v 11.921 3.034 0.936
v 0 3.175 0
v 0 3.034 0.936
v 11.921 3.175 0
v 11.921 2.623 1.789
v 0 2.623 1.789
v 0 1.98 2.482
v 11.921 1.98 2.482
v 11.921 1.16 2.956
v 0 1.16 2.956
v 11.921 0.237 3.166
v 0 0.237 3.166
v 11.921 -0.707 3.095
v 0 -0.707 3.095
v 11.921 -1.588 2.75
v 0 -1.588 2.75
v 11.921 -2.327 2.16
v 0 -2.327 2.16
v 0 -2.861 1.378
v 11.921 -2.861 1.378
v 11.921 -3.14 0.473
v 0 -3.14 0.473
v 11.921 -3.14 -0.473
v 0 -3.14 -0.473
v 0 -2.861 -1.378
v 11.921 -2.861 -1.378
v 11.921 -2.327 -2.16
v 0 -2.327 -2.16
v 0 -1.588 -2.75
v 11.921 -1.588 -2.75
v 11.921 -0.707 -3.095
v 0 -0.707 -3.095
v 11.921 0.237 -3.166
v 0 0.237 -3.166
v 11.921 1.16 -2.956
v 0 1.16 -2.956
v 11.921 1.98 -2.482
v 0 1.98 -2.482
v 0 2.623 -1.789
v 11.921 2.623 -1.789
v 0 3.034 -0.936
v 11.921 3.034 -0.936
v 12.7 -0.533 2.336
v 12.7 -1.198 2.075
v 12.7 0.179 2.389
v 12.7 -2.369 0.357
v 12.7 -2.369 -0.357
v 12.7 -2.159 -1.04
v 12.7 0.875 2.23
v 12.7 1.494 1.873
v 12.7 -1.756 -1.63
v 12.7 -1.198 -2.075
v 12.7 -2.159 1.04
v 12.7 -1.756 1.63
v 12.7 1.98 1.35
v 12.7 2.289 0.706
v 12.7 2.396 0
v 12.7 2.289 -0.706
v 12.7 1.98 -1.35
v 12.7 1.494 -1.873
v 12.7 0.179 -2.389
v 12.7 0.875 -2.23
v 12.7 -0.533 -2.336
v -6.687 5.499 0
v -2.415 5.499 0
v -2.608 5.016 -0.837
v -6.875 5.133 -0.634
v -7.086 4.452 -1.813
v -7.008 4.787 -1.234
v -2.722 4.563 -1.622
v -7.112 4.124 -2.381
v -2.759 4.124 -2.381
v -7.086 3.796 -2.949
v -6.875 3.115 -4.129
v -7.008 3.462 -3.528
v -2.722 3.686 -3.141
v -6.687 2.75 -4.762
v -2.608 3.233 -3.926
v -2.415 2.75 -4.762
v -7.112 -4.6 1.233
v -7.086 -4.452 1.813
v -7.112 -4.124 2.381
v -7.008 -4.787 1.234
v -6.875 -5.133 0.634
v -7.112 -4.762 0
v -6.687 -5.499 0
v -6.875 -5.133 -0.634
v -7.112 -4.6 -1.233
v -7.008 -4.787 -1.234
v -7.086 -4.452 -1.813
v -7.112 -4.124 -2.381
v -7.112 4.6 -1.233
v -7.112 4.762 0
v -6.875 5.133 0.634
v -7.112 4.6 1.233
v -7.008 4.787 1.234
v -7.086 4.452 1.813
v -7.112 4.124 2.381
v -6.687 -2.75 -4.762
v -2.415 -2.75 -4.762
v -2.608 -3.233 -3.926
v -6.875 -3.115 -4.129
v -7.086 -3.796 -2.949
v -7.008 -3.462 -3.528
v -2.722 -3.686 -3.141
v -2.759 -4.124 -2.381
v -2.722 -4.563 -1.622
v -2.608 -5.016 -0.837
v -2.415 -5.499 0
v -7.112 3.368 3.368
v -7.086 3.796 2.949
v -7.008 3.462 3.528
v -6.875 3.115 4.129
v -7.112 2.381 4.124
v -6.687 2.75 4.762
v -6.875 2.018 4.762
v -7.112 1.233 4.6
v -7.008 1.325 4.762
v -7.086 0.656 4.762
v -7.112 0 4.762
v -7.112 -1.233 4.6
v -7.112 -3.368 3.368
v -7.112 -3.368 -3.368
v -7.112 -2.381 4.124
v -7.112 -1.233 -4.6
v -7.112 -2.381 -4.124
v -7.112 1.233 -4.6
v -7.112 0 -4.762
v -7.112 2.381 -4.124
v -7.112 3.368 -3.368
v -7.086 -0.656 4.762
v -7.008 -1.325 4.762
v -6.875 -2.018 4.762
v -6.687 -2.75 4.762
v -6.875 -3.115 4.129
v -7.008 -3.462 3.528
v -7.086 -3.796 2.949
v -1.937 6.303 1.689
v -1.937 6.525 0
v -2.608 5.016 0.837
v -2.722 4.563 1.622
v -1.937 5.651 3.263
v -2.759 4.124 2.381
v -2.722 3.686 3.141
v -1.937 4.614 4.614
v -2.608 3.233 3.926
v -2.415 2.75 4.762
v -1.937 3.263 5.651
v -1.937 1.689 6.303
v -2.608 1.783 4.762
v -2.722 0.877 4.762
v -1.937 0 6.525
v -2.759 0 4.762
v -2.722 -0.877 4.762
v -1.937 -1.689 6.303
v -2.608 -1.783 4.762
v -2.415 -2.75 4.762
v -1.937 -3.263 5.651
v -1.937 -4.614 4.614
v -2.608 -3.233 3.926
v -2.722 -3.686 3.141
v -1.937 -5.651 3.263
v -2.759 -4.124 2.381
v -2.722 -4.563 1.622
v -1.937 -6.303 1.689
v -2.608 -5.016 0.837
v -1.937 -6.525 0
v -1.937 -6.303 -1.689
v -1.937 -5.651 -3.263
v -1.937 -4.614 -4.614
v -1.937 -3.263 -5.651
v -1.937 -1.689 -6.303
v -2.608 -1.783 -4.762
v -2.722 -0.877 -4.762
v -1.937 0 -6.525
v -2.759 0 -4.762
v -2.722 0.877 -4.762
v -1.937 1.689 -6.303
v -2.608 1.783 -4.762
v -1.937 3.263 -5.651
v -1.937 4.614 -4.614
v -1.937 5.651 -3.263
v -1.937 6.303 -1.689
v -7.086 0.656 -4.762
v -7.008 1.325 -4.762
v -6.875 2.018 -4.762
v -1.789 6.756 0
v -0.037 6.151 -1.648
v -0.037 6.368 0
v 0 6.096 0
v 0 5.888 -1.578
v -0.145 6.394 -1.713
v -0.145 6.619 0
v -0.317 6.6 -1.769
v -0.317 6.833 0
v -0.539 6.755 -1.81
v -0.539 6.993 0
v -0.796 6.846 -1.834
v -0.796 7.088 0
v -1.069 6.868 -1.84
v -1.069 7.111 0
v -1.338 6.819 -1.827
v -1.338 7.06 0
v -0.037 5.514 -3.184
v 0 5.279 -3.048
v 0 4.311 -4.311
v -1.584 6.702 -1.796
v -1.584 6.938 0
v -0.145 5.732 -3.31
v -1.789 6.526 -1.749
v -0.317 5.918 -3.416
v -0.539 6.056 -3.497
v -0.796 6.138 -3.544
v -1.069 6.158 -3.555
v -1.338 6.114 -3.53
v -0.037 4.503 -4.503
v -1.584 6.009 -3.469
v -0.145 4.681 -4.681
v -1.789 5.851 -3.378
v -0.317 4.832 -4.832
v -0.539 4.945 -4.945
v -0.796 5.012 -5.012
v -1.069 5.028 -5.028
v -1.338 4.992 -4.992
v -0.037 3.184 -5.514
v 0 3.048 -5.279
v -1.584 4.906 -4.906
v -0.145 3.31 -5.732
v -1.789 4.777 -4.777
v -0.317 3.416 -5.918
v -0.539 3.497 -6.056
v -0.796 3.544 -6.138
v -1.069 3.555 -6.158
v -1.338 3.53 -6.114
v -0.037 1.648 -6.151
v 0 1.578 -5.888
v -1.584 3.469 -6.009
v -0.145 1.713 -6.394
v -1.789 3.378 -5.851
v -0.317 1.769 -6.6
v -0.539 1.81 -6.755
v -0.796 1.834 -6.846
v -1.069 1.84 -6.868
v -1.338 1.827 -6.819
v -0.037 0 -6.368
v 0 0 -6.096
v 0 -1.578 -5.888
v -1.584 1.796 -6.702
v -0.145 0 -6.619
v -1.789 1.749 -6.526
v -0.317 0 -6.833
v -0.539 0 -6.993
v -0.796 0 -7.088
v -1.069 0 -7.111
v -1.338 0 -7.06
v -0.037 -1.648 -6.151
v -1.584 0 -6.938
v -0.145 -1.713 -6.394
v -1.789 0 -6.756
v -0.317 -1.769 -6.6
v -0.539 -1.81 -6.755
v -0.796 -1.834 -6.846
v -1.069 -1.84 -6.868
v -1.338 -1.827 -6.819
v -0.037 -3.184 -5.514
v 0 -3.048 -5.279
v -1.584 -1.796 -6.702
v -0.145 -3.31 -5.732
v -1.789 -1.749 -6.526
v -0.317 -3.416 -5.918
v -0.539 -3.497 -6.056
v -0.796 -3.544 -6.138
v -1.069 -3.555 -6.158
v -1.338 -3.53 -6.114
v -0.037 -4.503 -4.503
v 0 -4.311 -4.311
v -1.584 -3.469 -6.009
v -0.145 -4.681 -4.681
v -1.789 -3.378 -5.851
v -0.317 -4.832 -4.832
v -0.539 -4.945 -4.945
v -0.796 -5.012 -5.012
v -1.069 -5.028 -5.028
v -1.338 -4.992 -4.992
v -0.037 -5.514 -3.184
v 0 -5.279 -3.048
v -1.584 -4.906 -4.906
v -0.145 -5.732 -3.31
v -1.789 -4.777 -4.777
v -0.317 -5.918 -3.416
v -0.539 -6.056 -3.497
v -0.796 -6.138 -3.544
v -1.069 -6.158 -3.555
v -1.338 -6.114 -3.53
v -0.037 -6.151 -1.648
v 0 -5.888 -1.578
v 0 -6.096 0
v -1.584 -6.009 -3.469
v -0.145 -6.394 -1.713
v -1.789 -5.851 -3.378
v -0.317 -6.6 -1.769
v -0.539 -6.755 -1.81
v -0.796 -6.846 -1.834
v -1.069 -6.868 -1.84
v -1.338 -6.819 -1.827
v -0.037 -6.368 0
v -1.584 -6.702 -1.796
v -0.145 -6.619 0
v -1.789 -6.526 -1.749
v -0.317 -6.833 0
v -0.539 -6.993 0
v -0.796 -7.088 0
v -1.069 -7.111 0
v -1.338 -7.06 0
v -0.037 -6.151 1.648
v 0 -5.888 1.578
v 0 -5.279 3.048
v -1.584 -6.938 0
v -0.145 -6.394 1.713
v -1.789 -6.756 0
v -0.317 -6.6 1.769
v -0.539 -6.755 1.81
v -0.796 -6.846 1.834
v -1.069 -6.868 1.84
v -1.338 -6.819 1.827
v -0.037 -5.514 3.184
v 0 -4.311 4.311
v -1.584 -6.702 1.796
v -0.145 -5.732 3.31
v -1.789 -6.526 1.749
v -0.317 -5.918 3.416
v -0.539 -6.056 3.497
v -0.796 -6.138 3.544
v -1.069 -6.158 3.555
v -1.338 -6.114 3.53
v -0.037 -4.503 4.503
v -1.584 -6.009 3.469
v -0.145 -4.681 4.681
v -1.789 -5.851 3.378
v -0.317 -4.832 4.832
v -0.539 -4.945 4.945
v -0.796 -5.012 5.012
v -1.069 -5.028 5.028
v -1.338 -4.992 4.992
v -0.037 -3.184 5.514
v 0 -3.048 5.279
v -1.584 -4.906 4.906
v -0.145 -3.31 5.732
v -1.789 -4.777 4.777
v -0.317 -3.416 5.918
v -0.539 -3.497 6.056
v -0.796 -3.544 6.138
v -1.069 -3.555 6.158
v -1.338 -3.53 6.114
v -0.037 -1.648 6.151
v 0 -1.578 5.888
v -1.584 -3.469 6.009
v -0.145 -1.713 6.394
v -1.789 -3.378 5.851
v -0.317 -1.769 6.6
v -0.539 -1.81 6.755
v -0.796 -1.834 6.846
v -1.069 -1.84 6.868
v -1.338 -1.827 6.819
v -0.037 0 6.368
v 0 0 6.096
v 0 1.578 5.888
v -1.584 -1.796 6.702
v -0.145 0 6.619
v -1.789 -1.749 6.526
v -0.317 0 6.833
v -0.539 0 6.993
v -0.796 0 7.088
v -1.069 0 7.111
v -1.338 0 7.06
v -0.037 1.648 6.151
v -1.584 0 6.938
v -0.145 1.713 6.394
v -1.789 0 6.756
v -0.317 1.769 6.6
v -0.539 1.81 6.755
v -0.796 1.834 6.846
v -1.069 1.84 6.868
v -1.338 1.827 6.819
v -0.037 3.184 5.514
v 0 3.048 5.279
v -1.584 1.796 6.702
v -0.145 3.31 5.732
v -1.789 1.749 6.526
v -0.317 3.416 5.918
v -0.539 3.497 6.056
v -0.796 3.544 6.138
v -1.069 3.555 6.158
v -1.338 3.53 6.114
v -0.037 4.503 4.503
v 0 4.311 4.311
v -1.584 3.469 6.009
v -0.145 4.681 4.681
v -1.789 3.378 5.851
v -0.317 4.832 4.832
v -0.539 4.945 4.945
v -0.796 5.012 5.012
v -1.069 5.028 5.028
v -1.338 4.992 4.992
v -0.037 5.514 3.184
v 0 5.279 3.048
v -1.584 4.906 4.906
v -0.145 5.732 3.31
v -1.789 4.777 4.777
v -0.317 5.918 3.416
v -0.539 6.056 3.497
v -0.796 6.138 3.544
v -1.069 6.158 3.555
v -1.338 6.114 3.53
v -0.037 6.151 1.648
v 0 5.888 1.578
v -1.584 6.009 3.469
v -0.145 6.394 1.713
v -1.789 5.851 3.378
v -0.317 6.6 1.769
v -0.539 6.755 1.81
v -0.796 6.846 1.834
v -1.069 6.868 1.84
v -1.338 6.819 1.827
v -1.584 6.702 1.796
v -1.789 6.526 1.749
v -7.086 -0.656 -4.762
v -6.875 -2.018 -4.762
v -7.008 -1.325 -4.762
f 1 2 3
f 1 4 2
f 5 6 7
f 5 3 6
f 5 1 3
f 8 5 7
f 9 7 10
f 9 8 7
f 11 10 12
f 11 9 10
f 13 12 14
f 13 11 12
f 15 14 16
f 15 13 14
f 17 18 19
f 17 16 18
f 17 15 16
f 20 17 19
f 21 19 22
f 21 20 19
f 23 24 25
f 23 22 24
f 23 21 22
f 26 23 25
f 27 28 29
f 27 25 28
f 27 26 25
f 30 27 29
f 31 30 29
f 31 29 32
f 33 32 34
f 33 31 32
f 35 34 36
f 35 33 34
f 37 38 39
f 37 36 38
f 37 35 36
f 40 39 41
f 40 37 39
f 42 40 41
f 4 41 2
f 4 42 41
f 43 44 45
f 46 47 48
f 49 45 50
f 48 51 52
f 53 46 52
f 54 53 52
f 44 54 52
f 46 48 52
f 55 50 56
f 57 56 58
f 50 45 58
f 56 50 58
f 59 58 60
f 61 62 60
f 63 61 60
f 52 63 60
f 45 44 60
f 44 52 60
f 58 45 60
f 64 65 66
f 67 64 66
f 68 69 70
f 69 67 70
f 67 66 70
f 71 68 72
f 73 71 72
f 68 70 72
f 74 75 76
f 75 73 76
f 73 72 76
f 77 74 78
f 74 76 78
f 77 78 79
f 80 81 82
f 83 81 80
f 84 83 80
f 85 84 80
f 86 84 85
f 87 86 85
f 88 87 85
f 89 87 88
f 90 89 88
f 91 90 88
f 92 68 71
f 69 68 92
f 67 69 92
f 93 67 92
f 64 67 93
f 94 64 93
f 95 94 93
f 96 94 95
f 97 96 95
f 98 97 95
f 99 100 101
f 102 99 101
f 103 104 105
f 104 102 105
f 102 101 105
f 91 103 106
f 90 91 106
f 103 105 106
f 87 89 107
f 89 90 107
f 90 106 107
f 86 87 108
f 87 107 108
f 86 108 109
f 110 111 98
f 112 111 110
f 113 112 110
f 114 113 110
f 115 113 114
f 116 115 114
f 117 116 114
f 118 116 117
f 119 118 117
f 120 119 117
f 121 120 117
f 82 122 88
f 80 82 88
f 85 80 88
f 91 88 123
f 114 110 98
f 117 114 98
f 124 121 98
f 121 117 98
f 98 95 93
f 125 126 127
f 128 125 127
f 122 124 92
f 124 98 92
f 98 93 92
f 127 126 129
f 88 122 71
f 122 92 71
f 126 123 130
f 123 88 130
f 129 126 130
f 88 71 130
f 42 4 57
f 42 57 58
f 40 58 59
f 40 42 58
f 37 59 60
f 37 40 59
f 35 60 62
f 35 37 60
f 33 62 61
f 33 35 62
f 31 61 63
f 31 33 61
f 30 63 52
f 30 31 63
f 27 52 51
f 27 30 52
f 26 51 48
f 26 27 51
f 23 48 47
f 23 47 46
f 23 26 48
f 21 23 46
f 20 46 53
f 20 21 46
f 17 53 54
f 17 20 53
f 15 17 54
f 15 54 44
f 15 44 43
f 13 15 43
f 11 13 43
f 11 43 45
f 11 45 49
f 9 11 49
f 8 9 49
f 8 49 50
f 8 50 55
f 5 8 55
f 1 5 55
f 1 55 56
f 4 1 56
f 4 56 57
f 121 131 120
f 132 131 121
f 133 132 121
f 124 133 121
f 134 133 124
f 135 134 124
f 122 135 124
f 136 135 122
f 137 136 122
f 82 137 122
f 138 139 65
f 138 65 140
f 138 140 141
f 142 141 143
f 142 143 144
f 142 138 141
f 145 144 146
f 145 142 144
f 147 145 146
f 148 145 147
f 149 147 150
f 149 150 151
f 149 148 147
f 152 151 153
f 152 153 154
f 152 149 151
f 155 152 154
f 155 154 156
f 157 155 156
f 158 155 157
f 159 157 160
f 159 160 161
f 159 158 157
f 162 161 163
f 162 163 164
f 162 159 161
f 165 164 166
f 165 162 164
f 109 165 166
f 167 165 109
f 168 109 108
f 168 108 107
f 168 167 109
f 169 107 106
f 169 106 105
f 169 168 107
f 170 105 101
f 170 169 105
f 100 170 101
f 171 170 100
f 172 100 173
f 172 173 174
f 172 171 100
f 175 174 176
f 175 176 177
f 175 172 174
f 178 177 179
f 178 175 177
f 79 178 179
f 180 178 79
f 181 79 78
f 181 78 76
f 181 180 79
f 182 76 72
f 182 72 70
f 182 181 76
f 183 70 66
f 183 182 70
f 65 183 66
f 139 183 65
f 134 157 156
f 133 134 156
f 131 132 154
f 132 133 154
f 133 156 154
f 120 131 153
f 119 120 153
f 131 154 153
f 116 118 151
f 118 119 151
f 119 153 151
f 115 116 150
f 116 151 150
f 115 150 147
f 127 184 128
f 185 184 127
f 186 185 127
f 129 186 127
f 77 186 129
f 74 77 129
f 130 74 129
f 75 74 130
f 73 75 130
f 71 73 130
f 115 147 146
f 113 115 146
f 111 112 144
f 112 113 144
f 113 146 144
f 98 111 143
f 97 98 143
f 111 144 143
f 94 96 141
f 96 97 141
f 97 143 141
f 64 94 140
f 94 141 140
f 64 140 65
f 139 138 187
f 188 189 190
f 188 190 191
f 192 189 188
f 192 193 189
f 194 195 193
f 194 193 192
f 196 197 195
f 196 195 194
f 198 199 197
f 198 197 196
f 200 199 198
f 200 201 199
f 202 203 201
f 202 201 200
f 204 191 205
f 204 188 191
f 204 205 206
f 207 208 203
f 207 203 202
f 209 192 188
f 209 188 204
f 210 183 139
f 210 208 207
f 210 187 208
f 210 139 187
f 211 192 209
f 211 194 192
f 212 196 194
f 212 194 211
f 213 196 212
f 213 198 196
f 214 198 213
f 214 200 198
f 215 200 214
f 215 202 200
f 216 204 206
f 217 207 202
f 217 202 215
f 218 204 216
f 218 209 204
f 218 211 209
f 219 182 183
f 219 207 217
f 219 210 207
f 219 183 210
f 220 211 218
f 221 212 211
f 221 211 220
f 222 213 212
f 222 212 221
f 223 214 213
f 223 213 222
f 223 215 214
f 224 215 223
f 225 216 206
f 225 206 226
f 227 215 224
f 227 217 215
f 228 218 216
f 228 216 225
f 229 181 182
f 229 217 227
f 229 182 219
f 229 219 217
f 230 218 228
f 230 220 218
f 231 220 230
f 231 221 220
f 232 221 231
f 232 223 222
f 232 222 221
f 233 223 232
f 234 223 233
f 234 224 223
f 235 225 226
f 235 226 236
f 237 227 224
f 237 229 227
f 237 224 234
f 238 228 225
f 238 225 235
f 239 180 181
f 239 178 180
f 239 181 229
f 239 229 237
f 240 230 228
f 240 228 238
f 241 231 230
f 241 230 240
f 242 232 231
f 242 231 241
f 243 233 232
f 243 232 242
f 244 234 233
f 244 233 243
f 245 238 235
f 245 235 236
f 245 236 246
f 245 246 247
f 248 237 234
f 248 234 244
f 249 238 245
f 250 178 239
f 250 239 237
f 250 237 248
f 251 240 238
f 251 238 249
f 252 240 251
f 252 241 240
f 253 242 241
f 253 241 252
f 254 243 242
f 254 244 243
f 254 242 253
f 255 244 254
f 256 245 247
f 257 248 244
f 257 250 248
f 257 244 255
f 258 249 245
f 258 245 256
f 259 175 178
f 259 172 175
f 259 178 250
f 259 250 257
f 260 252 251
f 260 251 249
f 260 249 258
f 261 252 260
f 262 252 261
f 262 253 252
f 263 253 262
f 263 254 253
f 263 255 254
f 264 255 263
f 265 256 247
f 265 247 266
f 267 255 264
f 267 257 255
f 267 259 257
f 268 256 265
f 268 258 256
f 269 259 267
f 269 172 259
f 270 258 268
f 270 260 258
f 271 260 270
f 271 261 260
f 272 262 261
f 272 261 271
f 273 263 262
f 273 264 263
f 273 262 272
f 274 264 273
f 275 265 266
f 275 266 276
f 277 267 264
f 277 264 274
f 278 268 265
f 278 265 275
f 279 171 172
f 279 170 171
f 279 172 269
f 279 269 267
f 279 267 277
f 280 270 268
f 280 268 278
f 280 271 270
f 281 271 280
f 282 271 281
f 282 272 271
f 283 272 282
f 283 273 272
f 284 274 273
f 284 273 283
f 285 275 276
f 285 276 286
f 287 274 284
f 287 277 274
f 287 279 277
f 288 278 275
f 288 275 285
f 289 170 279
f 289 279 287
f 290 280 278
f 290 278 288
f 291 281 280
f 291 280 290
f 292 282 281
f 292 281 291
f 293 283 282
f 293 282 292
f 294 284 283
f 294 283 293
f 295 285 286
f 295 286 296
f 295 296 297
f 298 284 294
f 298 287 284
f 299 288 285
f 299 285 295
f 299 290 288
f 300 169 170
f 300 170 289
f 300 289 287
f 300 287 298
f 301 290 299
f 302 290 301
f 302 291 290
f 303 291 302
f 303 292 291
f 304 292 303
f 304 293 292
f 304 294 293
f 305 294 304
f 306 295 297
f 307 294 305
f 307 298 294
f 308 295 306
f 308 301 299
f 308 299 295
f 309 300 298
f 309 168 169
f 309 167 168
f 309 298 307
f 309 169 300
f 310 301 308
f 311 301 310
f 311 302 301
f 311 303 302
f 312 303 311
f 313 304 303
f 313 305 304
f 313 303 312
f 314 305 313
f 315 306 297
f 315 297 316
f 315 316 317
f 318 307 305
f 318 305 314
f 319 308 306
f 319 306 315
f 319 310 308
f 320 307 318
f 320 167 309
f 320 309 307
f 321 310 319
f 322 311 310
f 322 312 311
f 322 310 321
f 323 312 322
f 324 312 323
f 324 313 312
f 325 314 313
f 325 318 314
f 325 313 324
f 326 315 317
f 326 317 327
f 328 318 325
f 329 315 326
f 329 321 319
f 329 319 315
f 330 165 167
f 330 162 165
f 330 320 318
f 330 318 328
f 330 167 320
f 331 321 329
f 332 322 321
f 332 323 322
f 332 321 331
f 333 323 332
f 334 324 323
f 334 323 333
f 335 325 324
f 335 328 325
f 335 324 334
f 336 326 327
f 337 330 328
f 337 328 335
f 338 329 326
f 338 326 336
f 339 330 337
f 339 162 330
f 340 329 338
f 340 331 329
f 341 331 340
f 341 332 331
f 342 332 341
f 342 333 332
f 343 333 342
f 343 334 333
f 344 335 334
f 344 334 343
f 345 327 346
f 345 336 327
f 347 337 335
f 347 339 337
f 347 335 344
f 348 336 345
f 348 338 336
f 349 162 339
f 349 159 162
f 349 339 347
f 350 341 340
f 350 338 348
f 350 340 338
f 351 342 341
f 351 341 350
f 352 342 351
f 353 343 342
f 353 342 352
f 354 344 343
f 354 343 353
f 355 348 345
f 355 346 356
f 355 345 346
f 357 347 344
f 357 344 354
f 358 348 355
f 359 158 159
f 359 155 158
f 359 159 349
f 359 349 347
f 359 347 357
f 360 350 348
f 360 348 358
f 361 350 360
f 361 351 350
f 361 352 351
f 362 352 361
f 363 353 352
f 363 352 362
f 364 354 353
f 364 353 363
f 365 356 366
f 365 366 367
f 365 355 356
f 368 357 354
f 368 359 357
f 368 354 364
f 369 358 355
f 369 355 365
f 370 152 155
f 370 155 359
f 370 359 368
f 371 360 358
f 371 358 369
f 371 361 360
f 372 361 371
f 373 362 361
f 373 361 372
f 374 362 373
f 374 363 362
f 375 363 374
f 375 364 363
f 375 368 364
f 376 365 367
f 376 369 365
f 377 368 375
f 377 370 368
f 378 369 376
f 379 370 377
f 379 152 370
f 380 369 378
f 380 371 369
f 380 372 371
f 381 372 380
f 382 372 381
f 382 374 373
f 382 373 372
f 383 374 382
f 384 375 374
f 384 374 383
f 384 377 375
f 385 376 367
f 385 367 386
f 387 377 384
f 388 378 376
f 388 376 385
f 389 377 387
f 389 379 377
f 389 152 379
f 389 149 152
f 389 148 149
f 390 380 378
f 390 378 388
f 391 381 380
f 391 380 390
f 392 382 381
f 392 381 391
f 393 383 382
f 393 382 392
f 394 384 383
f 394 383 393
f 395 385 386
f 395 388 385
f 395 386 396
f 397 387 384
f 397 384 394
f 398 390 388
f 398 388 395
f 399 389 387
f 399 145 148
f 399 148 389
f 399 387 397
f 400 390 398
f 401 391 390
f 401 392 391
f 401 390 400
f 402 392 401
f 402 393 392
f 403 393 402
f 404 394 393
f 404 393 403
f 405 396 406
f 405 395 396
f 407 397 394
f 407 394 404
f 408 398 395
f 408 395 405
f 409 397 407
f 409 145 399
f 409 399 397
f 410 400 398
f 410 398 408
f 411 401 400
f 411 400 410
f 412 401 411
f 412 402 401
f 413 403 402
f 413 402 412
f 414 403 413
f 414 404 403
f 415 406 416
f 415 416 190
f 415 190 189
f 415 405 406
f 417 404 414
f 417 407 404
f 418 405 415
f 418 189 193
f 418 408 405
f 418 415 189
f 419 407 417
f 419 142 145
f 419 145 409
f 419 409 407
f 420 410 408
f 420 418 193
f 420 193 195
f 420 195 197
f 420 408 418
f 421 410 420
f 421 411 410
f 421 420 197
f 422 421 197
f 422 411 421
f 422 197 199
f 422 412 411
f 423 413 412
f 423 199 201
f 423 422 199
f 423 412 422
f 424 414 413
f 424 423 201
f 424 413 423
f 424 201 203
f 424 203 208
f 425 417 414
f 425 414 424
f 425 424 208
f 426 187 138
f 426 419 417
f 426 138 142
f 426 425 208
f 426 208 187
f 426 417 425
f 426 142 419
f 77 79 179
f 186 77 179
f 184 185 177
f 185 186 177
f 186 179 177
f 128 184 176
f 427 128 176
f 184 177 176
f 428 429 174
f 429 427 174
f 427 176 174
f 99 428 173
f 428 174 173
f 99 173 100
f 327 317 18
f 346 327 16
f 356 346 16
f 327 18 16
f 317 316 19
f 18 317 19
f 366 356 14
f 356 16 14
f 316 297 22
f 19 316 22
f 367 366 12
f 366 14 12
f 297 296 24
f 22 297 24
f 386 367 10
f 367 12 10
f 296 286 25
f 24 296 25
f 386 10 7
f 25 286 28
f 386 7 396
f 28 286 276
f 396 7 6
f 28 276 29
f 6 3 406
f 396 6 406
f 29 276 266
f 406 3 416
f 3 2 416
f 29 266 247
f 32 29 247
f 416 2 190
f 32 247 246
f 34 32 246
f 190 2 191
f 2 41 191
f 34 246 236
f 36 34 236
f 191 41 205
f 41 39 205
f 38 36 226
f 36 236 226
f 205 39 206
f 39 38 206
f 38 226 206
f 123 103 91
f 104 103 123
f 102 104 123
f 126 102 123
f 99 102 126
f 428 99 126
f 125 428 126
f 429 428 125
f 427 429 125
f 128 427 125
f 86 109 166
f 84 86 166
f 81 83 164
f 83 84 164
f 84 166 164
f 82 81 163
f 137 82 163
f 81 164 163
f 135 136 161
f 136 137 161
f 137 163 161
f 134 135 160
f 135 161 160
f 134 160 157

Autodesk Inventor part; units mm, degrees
ref_plane "YZ Plane" through (0, 0, 0) normal (1, 0, 0) x (0, 1, 0)
ref_plane "XZ Plane" through (0, 0, 0) normal (0, 1, 0) x (-1, 0, 0)
sketch "Sketch1" plane through (0, 0, 0) normal (0, 0, 1) x (1, 0, 0)
  line L0 (-3.2004, 0) -> (-3.2004, 3.8156)
  line L1 (0, 6.096) -> (0, 3.175)
  line L2 (1.905, 3.175) -> (12.7, 3.175)
  line L3 (12.7, 3.175) -> (12.7, 0)
  line L4 (12.7, 0) -> (-3.2004, 0)
  arc A0 (0, 6.096) -> (-1.9368, 6.5254) centre (-1.016, 6.096) ccw
  line L5 (0, -1.4605) -> (0, 8.7631) projected
  line L6 (-6.3805, 0) -> (15.8801, 0) projected
  line L7 (0, 3.175) -> (0.0001, 3.175)
  line L8 (0.0001, 3.175) -> (0.0001, 3.175)
  line L9 (0.0001, 3.175) -> (0.635, 3.175)
  line L10 (0.635, 3.175) -> (1.905, 3.175)
  line L11 (-3.2004, 3.8156) -> (-1.9368, 6.5254)
  line L12 (0.0001, 3.175) -> (1.905, 3.175) construction
  line L13 (1.905, 3.175) -> (1.905, 0) construction
  dimension "d0" = 1.016
  dimension "d1" = 12.7
  dimension "d2" = 10.795
  dimension "d3" = 14.224
  dimension "d4" = 6.35
  dimension "d5" = 3.2004
  dimension "d15" = 6.35
  dimension "d16" = 6.35
  dimension "d17" = 0.0001
  dimension "d18" = 1.27
  dimension "d19" = 25
revolve "Body" add sketch "Sketch1" angle 360 about axis through (12.7, 0, 0) along (-1, 0, 0)
sketch "Sketch2" plane through (0, 0, 0) normal (1, 0, 0) x (0, 0, -1)
  line L0 (4.7625, 2.7496) -> (4.7625, -2.7496)
  line L1 (4.7625, -2.7496) -> (0, -5.4993)
  line L2 (0, -5.4993) -> (-4.7625, -2.7496)
  line L3 (-4.7625, -2.7496) -> (-4.7625, 2.7496)
  line L4 (-4.7625, 2.7496) -> (0, 5.4993)
  line L5 (0, 5.4993) -> (4.7625, 2.7496)
  point P0 (0, 0)
  point P1 (0, 0)
  dimension "d23" = 9.525
extrude "Head" add sketch "Sketch2" against normal blind 7.112
sketch "Sketch3" plane through (0, 0, 0) normal (0, 0, 1) x (1, 0, 0)
  line L0 (-7.112, 4.7625) -> (-7.112, 5.4993)
  line L1 (-7.112, 5.4993) -> (-6.6866, 5.4993)
  line L2 (-6.6866, 5.4993) -> (-7.112, 4.7625)
  line L3 (-8.0513, 0) -> (-1.476, 0) projected
  line L4 (-7.112, 5.4993) -> (-7.112, 2.7496) projected
  line L5 (-2.4153, 5.4993) -> (-7.112, 5.4993) projected
  point P0 (-7.112, 2.7496)
  dimension "d8" = 30
  dimension "d22" = 9.525
revolve "Chamfer1" cut sketch "Sketch3" angle 360 about axis through (-10, 0, 0) along (1, 0, 0)
thread "Thread" size "1/4-20 UNC" class "2A" standard "ANSI Unified Screw Threads" length 10.795
chamfer "Chamfer2" distance 0.7791 distance2 0.7791 1 edges at (12.7, -3.175, 0) measured on face at (12.7, 1.0583, 0)
ref_plane "Work Plane1" through (10.95, 0, 0) normal (0, 0, -1) x (1, 0, 0)
equation "\"d0\" = PHH"
equation "\"d1\" = NLG"
equation "\"d2\" = GEL"
equation "\"d3\" = LADI"
equation "\"d4\" = GD"
equation "\"d5\" = 0.45 * KOH"
equation "\"d15\" = SD2"
equation "\"d16\" = BDM"
equation "\"d18\" = GAL"
equation "\"d19\" = KEWI"
equation "\"d23\" = SW"
equation "\"d6\" = KOH"
equation "\"d8\" = ANG1"
equation "\"d22\" = SW0"
equation "\"d10\" = GEL"
equation "\"d13\" = -0.5 * SPD + 0.5 * GD"
equation "\"d14\" = GUL"
equation "\"NLG\" = 12.7"
equation "\"GD\" = NND"
equation "\"BDM\" = NND"
equation "\"KOH\" = 7.112"
equation "\"GEL\" = 10.795"
equation "\"LADI\" = 14.224"
equation "\"SW\" = 9.525"
equation "\"PHH\" = 1.016"
equation "\"SW0\" = SW"
equation "\"SPD\" = 4.79184"
equation "\"SD2\" = NND"
equation "\"SD\" = 0"
equation "\"ANG1\" = 30deg"
equation "\"KEWI\" = 25deg"
equation "\"GAL\" = 1.27"
equation "\"GUL\" = 0.77908"
equation "\"THREADDIA\" = 6.35"
equation "\"SDH\" = SW"
equation "\"TOA\" = 30deg"
equation "\"NND\" = 6.35"
equation "\"E0\" = 1.155 * SW"
equation "\"GD1\" = 4.79184"
properties part number "IFI 111 - 1/4-20 UNC x 0.5" material "Steel, Mild"
